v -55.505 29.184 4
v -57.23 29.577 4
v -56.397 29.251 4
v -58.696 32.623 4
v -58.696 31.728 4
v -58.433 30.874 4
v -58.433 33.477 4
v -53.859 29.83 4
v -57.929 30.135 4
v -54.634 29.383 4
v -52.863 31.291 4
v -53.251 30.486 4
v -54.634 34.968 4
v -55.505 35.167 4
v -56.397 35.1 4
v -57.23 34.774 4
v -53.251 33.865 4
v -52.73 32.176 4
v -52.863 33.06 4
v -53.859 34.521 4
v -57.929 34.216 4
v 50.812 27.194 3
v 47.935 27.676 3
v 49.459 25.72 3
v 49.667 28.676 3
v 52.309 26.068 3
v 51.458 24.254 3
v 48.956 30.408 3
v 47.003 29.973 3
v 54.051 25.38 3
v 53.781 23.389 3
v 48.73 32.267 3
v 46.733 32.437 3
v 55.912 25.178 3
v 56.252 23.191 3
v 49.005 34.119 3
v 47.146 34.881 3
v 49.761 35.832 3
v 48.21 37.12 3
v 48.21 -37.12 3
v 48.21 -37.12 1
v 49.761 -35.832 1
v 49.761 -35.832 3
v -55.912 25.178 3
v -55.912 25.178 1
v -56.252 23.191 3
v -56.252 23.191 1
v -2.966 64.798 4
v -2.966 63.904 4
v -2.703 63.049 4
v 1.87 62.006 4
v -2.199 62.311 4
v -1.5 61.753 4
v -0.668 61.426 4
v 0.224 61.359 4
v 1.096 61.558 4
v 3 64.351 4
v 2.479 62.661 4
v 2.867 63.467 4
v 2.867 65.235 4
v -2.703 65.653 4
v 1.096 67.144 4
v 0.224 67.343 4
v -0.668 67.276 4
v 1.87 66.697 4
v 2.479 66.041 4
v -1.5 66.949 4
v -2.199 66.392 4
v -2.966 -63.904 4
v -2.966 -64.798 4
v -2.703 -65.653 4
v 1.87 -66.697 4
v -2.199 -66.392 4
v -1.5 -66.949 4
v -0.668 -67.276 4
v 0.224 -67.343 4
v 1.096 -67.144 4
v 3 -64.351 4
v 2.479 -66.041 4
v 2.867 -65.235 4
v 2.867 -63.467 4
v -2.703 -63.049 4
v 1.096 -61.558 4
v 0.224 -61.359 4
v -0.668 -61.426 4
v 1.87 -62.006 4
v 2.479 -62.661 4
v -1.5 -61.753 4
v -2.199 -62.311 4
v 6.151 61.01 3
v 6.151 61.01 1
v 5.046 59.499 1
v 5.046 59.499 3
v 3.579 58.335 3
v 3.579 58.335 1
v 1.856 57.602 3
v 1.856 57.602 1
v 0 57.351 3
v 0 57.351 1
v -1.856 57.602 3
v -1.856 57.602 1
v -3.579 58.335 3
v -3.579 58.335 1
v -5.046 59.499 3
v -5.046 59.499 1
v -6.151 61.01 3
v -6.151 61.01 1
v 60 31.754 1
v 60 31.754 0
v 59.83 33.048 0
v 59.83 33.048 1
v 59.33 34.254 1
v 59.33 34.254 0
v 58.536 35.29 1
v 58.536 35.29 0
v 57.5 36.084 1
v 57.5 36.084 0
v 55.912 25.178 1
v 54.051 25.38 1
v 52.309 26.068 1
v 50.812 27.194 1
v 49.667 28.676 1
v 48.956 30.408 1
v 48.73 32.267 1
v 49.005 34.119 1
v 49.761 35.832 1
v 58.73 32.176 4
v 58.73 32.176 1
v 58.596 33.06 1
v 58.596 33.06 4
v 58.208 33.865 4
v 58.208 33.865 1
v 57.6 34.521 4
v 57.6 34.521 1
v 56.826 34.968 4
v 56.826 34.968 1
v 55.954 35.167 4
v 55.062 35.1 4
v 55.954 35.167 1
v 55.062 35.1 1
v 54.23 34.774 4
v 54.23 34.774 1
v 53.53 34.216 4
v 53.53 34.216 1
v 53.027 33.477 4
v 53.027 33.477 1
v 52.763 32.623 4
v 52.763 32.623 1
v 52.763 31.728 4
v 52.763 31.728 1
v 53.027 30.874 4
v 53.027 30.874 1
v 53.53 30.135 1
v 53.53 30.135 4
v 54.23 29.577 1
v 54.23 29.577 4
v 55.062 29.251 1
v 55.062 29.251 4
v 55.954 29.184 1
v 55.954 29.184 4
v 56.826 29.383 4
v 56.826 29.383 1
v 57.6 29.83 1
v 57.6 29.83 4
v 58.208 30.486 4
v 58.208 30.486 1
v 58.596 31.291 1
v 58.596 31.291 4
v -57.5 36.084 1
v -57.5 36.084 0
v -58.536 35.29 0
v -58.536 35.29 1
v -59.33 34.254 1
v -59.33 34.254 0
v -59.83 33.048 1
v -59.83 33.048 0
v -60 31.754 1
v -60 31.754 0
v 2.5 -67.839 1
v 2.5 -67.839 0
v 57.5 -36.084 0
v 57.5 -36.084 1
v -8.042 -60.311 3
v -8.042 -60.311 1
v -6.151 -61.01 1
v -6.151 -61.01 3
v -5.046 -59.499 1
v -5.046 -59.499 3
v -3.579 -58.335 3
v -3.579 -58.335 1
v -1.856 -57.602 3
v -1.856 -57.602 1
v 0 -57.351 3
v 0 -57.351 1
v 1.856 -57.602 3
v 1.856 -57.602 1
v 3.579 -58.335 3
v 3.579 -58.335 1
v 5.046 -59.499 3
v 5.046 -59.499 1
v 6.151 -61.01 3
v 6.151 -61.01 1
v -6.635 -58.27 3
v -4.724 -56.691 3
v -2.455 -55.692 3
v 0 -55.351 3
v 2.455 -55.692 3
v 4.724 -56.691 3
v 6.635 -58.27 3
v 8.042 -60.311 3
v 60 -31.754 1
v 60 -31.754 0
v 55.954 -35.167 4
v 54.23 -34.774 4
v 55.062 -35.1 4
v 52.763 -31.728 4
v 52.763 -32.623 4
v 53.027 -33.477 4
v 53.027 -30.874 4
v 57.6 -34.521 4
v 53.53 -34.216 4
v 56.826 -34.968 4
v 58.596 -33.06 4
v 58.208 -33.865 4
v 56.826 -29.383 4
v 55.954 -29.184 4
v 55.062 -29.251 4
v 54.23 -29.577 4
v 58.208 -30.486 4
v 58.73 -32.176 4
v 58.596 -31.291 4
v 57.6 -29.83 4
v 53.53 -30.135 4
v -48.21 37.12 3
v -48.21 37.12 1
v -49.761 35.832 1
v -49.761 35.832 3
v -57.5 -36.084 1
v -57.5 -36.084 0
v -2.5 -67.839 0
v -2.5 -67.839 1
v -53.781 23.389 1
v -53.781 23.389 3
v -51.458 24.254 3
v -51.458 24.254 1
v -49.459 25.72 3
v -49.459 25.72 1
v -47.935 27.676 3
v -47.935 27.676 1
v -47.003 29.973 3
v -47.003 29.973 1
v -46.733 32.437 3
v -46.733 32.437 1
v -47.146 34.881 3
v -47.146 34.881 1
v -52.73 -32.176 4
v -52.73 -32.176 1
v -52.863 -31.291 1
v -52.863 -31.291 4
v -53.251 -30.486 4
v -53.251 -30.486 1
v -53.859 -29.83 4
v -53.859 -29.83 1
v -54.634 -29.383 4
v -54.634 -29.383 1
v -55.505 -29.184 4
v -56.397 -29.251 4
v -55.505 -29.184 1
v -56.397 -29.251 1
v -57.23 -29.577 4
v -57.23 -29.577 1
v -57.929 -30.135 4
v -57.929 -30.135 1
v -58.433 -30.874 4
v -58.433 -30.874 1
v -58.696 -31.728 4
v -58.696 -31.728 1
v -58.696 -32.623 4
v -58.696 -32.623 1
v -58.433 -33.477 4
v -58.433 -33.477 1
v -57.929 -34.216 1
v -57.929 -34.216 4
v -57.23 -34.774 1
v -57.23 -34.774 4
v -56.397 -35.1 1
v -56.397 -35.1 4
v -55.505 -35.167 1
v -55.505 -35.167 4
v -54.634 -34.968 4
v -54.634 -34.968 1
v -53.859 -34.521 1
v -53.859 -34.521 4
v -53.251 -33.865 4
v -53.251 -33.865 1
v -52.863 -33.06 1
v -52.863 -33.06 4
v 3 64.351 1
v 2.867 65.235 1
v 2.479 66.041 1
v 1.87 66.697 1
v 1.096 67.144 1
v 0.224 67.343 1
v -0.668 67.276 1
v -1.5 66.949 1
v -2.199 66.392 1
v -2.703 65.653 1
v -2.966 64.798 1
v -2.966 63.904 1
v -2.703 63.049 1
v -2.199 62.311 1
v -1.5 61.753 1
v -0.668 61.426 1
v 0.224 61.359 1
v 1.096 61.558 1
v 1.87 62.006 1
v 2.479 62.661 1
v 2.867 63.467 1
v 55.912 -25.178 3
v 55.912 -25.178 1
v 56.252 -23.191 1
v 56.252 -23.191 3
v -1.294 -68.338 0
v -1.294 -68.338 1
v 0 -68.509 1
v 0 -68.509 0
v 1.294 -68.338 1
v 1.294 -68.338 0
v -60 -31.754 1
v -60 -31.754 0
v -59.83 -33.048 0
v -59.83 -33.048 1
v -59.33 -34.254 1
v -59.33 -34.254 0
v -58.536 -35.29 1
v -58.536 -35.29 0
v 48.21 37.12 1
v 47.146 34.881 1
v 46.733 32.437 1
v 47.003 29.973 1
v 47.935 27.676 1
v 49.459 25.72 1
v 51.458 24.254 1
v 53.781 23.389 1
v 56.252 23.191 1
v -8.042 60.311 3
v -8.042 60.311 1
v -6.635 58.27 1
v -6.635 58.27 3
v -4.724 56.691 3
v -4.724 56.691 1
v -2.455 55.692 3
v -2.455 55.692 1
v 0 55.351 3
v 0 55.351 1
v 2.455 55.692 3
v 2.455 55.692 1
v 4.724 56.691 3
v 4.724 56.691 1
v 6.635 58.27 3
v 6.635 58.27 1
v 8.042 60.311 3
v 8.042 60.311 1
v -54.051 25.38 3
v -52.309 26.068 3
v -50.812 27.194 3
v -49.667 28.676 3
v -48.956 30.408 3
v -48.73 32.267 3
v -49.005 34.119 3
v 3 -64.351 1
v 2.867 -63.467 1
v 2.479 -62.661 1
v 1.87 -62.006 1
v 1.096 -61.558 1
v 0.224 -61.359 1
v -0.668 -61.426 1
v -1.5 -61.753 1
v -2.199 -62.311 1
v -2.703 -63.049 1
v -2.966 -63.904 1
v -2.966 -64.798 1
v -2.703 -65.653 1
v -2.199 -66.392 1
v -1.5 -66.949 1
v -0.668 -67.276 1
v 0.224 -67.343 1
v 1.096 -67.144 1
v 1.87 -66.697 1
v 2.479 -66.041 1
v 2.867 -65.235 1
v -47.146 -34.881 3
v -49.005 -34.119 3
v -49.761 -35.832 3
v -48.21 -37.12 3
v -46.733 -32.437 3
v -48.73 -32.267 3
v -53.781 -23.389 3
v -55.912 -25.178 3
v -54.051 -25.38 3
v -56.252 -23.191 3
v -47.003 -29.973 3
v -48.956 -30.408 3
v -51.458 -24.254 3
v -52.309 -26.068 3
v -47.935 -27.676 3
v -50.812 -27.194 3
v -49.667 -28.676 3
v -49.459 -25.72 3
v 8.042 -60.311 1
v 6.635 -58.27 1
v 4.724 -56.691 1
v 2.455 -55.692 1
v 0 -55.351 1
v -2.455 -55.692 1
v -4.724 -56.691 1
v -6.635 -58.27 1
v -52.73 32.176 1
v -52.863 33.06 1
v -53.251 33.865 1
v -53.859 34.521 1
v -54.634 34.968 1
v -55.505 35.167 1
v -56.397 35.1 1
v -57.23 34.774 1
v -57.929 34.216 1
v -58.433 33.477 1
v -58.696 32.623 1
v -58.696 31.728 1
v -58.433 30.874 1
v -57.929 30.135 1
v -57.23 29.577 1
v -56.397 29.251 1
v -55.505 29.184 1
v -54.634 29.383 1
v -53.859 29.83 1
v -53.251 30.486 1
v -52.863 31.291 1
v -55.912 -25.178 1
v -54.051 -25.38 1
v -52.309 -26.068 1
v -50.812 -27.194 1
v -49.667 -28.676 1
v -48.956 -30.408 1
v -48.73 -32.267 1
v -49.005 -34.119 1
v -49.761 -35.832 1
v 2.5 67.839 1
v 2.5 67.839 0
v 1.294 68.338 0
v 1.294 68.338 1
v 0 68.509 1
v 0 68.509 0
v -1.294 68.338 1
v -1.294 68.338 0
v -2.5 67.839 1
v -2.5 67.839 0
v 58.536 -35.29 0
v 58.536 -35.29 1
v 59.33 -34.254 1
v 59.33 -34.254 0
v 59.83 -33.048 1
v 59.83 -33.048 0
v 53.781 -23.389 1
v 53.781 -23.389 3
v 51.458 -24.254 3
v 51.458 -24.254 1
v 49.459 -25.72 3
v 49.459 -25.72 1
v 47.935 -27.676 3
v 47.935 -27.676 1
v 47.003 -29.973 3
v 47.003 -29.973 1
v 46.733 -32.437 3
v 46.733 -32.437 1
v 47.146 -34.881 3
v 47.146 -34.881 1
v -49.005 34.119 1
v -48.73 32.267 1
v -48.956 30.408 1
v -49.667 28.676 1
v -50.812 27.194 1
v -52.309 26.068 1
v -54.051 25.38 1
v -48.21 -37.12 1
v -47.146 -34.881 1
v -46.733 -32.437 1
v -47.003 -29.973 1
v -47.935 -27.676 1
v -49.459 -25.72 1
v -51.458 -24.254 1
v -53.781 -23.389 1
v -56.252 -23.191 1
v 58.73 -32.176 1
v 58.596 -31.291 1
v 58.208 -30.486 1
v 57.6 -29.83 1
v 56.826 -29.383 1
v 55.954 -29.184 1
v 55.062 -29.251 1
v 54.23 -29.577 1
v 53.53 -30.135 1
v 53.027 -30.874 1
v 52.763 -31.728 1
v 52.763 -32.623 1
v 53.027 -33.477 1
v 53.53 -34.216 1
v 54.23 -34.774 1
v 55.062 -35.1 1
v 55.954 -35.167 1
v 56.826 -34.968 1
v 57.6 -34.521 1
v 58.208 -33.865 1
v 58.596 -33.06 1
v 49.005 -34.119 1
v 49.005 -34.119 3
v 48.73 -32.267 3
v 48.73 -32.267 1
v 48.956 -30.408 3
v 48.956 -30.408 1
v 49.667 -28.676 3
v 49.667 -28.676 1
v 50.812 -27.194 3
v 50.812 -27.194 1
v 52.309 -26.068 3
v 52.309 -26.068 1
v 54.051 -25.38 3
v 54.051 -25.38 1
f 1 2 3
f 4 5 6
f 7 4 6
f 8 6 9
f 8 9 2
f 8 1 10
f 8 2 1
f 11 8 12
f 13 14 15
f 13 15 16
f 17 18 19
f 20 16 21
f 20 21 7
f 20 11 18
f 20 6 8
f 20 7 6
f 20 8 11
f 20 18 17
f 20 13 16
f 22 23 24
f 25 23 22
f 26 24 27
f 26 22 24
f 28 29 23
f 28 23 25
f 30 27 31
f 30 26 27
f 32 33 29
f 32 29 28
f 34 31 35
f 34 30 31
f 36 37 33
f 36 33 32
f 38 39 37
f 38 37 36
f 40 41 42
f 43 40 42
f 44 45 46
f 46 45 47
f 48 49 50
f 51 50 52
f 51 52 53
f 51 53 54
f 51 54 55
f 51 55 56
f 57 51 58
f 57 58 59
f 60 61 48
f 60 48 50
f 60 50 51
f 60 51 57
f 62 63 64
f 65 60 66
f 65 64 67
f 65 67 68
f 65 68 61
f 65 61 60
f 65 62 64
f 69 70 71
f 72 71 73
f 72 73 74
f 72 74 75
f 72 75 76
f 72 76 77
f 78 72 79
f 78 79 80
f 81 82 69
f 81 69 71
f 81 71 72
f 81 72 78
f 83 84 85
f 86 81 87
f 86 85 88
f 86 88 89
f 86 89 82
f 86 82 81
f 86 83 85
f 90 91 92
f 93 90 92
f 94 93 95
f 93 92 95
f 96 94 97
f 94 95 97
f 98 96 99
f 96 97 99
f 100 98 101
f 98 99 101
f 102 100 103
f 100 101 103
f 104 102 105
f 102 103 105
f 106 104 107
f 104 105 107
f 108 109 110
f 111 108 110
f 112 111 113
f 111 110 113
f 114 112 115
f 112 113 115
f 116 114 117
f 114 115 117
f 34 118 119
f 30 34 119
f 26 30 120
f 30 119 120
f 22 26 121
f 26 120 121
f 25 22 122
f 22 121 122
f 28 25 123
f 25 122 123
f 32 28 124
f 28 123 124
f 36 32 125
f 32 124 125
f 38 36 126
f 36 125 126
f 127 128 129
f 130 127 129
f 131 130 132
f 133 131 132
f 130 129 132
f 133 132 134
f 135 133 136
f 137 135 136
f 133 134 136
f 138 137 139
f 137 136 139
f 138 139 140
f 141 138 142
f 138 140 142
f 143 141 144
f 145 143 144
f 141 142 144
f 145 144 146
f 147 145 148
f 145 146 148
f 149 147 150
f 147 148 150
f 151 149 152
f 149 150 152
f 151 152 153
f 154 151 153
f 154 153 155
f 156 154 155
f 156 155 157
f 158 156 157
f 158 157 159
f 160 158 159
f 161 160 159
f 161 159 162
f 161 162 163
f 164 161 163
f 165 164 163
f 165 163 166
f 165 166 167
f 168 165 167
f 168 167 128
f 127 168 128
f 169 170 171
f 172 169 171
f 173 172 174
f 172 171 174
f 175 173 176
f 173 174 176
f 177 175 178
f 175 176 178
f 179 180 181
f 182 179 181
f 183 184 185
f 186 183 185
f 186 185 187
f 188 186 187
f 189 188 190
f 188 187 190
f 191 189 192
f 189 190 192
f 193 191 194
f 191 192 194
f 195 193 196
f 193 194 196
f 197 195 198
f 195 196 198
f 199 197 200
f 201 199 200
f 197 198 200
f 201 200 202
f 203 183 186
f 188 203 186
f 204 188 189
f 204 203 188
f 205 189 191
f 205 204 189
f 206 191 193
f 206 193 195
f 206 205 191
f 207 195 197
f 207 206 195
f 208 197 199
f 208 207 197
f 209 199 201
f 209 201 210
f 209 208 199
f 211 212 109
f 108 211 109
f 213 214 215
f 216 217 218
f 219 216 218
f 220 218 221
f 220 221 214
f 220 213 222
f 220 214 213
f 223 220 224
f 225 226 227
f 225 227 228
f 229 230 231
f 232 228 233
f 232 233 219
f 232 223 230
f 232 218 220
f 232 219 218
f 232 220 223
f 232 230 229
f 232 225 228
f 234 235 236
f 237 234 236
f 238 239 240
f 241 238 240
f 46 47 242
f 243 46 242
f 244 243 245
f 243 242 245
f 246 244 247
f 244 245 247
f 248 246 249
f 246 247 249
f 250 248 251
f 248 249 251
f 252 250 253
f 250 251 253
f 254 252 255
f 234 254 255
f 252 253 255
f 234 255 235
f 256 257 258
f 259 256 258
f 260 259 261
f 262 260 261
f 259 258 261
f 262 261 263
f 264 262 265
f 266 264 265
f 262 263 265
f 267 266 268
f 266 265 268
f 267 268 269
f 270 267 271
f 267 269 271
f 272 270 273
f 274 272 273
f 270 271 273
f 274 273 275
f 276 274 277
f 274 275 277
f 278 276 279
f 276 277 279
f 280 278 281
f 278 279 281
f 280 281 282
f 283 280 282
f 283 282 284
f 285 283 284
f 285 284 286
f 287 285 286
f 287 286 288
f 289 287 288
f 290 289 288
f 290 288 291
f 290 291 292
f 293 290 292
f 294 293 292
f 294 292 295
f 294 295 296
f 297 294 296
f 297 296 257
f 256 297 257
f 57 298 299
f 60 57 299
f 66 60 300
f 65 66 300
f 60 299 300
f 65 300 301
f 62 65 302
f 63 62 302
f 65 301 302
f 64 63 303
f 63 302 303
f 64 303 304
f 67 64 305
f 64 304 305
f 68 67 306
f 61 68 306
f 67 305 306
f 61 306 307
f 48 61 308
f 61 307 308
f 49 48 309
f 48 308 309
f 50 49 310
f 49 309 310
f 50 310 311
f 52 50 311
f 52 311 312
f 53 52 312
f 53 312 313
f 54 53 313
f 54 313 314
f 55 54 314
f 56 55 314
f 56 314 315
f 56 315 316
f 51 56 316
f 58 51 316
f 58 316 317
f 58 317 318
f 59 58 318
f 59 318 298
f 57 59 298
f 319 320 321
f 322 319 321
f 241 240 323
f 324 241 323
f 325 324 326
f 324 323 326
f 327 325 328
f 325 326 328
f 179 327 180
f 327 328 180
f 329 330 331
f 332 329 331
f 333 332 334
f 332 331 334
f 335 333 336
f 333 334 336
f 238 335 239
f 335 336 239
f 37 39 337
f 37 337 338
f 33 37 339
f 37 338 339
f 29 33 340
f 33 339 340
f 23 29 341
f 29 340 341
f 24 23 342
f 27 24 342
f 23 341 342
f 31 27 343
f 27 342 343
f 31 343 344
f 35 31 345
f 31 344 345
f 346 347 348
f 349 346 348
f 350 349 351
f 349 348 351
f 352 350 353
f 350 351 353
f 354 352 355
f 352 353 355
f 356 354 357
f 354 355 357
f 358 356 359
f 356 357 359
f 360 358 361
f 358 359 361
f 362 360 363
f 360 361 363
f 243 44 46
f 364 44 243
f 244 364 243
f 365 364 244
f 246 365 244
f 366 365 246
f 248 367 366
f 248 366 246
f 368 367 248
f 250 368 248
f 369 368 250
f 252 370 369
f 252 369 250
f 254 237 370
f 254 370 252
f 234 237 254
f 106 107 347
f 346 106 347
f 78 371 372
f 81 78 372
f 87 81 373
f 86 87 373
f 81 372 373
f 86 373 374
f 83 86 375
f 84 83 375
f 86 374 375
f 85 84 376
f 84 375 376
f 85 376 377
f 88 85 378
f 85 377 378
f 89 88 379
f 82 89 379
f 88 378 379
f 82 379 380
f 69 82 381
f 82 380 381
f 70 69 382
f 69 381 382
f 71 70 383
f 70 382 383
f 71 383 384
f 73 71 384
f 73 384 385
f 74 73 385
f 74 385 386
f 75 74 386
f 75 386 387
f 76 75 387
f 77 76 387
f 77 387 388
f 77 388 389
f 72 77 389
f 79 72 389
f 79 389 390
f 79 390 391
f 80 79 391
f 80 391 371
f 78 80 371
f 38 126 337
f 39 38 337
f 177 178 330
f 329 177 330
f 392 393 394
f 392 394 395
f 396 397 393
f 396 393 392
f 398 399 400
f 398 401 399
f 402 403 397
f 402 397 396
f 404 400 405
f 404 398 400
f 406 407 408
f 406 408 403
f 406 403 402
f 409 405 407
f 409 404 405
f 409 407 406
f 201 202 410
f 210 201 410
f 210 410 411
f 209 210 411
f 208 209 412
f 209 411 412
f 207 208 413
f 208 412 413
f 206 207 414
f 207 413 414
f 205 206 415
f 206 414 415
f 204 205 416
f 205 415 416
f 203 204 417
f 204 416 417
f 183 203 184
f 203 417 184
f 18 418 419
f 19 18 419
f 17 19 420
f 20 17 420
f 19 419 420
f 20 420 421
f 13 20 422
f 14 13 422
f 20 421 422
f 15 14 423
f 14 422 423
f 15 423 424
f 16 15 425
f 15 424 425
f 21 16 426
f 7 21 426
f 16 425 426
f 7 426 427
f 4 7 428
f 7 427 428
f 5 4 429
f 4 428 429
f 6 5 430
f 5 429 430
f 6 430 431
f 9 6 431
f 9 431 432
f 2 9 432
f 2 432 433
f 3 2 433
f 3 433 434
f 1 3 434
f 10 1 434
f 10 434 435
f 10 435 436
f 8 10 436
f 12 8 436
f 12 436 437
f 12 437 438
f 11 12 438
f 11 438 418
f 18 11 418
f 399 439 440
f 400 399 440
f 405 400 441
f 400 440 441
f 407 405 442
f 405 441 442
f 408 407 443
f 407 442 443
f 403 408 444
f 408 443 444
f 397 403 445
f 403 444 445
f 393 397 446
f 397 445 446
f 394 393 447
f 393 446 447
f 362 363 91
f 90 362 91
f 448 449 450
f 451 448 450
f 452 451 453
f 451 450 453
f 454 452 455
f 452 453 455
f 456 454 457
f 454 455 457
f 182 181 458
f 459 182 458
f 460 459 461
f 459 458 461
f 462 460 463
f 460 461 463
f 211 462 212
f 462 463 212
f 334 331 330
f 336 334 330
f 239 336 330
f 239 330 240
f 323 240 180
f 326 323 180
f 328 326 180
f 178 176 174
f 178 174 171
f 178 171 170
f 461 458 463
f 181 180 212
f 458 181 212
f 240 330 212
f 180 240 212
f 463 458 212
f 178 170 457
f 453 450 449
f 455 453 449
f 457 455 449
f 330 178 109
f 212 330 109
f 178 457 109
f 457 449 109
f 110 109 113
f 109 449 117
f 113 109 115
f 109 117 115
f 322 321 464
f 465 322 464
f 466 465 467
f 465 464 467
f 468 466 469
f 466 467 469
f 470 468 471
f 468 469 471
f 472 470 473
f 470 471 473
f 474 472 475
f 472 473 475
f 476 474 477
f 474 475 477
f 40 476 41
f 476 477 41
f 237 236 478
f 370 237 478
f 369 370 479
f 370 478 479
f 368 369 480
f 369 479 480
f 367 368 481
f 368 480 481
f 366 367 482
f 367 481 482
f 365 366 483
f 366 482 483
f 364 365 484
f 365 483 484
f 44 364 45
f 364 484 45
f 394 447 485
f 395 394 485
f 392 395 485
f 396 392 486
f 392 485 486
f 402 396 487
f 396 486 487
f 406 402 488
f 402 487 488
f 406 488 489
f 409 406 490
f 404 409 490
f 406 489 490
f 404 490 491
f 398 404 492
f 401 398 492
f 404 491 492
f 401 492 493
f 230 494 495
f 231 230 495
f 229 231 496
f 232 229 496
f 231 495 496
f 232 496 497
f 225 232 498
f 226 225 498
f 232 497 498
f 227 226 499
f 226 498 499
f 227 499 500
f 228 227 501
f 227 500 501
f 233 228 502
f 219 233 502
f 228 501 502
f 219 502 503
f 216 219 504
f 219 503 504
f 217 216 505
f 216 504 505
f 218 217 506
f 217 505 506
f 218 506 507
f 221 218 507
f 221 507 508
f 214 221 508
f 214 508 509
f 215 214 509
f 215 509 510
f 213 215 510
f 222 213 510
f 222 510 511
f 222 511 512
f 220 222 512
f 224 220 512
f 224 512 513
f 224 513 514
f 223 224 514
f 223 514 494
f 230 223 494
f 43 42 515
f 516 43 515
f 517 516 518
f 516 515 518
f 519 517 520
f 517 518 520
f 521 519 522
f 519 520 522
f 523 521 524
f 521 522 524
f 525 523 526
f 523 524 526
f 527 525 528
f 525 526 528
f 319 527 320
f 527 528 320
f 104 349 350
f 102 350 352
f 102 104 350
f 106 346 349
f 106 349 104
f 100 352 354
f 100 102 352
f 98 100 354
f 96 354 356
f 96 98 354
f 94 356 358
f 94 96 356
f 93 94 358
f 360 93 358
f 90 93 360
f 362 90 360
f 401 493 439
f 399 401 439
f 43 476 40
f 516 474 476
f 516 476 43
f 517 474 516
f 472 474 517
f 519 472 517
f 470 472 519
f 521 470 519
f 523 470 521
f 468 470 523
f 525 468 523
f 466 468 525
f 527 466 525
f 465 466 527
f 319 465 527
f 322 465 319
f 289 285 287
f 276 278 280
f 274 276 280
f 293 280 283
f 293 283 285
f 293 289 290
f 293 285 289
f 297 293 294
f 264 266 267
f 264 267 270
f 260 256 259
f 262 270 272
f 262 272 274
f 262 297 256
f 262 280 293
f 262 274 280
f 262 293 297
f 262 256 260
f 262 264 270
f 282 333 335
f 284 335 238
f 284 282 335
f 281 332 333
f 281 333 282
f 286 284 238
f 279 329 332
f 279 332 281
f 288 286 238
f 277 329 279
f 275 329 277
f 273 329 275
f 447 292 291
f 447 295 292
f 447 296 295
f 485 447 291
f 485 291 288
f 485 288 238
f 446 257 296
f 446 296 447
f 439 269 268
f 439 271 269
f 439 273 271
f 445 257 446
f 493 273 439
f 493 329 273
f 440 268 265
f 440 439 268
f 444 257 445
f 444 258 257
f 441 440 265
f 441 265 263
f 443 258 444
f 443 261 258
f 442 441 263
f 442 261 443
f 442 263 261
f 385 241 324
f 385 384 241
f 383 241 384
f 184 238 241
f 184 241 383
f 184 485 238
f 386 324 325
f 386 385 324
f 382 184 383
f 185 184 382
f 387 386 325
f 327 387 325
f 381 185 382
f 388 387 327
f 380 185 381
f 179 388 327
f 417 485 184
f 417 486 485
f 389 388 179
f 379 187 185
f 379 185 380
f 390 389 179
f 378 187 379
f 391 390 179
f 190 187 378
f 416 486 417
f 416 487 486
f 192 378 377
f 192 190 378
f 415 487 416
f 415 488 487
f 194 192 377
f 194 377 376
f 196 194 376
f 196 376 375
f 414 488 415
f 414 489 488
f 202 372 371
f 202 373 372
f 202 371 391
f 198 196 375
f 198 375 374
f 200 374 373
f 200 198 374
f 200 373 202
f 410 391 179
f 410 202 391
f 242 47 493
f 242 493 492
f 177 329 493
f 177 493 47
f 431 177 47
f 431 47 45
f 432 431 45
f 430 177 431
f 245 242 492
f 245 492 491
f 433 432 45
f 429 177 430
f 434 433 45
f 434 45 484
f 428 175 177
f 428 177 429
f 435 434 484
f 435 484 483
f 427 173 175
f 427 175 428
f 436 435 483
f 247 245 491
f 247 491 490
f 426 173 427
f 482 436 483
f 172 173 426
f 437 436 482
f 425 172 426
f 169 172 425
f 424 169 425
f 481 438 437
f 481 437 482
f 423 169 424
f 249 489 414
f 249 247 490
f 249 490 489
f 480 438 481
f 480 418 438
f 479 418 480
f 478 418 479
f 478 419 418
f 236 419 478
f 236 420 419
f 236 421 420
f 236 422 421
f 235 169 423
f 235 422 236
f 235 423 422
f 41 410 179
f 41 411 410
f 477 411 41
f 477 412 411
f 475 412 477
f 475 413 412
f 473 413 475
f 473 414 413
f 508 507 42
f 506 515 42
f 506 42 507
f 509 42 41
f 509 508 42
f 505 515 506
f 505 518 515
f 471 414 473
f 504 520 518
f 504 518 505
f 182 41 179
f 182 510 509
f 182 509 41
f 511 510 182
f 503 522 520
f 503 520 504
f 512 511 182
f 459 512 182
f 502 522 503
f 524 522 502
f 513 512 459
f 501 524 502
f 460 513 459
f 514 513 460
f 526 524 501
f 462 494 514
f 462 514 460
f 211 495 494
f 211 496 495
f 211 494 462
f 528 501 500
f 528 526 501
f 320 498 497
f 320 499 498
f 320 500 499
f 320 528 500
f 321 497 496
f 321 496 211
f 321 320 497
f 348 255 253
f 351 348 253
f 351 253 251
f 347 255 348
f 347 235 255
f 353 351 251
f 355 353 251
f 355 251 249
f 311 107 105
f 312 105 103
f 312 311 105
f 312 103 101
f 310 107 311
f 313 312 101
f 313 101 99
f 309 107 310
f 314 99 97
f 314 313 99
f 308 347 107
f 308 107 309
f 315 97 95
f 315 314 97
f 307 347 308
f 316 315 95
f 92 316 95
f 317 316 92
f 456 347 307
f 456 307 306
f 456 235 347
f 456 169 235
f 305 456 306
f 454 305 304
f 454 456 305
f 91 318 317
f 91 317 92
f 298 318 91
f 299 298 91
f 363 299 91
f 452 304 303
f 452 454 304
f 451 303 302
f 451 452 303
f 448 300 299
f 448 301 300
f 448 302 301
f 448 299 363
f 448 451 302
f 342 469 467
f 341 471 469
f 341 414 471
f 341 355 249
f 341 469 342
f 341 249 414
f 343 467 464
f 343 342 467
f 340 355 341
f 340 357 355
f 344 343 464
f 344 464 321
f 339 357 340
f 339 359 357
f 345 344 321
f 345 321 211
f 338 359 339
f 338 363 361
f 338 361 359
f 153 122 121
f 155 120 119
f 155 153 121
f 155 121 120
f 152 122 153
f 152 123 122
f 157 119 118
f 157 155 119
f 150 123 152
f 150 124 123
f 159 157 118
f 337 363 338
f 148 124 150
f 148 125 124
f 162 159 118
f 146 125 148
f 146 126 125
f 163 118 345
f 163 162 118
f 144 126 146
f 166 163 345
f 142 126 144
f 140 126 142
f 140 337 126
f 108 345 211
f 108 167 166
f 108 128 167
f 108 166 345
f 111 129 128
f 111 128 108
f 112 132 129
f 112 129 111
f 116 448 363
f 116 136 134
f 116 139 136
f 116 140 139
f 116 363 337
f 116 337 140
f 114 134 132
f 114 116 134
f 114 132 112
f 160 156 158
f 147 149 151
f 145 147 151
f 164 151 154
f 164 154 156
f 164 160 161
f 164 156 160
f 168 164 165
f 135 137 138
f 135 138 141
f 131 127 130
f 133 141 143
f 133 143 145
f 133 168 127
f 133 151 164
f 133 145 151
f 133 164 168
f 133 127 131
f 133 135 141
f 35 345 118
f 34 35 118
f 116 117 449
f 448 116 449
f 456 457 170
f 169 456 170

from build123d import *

# Parameters (mm, degrees)
F0_R     = 3
F1_DEPTH = 1
F2_DEPTH = 3
F3_DEPTH = 4


with BuildPart() as f1:
    # F0 (on Top) → F1 (new body)
    with BuildSketch(Plane.XY):
        with BuildLine():
            Line((60, -31.7542648054), (60, 31.7542648054))
            ThreePointArc((60, 31.7542648054), (59.3301270189, 34.2542648054), (57.5, 36.0843918244))
            Line((57.5, 36.0843918244), (2.5, 67.8386566298))
            ThreePointArc((2.5, 67.8386566298), (0, 68.5085296109), (-2.5, 67.8386566298))
            Line((-2.5, 67.8386566298), (-57.5, 36.0843918244))
            ThreePointArc((-57.5, 36.0843918244), (-59.3301270189, 34.2542648054), (-60, 31.7542648054))
            Line((-60, 31.7542648054), (-60, -31.7542648054))
            ThreePointArc((-60, -31.7542648054), (-59.3301270189, -34.2542648054), (-57.5, -36.0843918244))
            Line((-57.5, -36.0843918244), (-2.5, -67.8386566298))
            ThreePointArc((-2.5, -67.8386566298), (0, -68.5085296109), (2.5, -67.8386566298))
            Line((2.5, -67.8386566298), (57.5, -36.0843918244))
            ThreePointArc((57.5, -36.0843918244), (59.3301270189, -34.2542648054), (60, -31.7542648054))
        make_face()
        with Locations((-55.7296181053, -32.1755099552)):
            Circle(F0_R, mode=Mode.SUBTRACT)
        with BuildLine():
            Line((-48.2098294683, -37.1204850669), (-49.760809999, -35.8324663113))
            ThreePointArc((-49.760809999, -35.8324663113), (-49.667440276, -28.6755099601), (-55.9122311458, -25.1778923265))
            Line((-55.9122311458, -25.1778923265), (-56.2521978402, -23.1906944078))
            ThreePointArc((-56.2521978402, -23.1906944078), (-47.9353894676, -27.6755099615), (-48.2098294683, -37.1204850669))
        make_face(mode=Mode.SUBTRACT)
        with Locations((0, -64.35102)):
            Circle(F0_R, mode=Mode.SUBTRACT)
        with BuildLine():
            Line((8.042368383, -60.3111795587), (6.1514211554, -61.0103587227))
            ThreePointArc((6.1514211554, -61.0103587227), (0, -57.35102), (-6.1514211554, -61.0103587227))
            Line((-6.1514211554, -61.0103587227), (-8.042368383, -60.3111795587))
            ThreePointArc((-8.042368383, -60.3111795587), (0, -55.35102), (8.042368383, -60.3111795587))
        make_face(mode=Mode.SUBTRACT)
        with BuildLine():
            Line((56.2521977284, -23.190694679), (55.9122310244, -25.1778925961))
            ThreePointArc((55.9122310244, -25.1778925961), (49.6674401378, -28.6755101995), (49.7608098263, -35.8324665512))
            Line((49.7608098263, -35.8324665512), (48.2098292894, -37.1204852993))
            ThreePointArc((48.2098292894, -37.1204852993), (47.9353893342, -27.6755101926), (56.2521977284, -23.190694679))
        make_face(mode=Mode.SUBTRACT)
        with Locations((55.7296179502, -32.1755102239)):
            Circle(F0_R, mode=Mode.SUBTRACT)
        with Locations((-55.7296180277, 32.1755100895)):
            Circle(F0_R, mode=Mode.SUBTRACT)
        with BuildLine():
            Line((-56.2521977843, 23.1906945434), (-55.9122310851, 25.1778924613))
            ThreePointArc((-55.9122310851, 25.1778924613), (-49.6674402069, 28.6755100798), (-49.7608099126, 35.8324664312))
            Line((-49.7608099126, 35.8324664312), (-48.2098293788, 37.1204851831))
            ThreePointArc((-48.2098293788, 37.1204851831), (-47.9353894009, 27.675510077), (-56.2521977843, 23.1906945434))
        make_face(mode=Mode.SUBTRACT)
        with BuildLine():
            Line((48.2098295578, 37.1204849507), (49.7608100854, 35.8324661914))
            ThreePointArc((49.7608100854, 35.8324661914), (49.6674403451, 28.6755098404), (55.9122312065, 25.1778921918))
            Line((55.9122312065, 25.1778921918), (56.2521978961, 23.1906942723))
            ThreePointArc((56.2521978961, 23.1906942723), (47.9353895343, 27.675509846), (48.2098295578, 37.1204849507))
        make_face(mode=Mode.SUBTRACT)
        with Locations((55.7296181828, 32.1755098209)):
            Circle(F0_R, mode=Mode.SUBTRACT)
        with BuildLine():
            Line((-8.0423682377, 60.311179578), (-6.1514210083, 61.0103587375))
            ThreePointArc((-6.1514210083, 61.0103587375), (1.382e-07, 57.35102), (6.1514213024, 61.0103587079))
            Line((6.1514213024, 61.0103587079), (8.0423685284, 60.3111795393))
            ThreePointArc((8.0423685284, 60.3111795393), (1.334e-07, 55.35102), (-8.0423682377, 60.311179578))
        make_face(mode=Mode.SUBTRACT)
        with Locations((1.551e-07, 64.35102)):
            Circle(F0_R, mode=Mode.SUBTRACT)
    extrude(amount=F1_DEPTH)

    # F0 (on Top) → F2 (join)
    with BuildSketch(Plane.XY):
        with BuildLine():
            ThreePointArc((-6.1514211554, -61.0103587227), (0, -57.35102), (6.1514211554, -61.0103587227))
            Line((6.1514211554, -61.0103587227), (8.042368383, -60.3111795587))
            ThreePointArc((8.042368383, -60.3111795587), (0, -55.35102), (-8.042368383, -60.3111795587))
            Line((-8.042368383, -60.3111795587), (-6.1514211554, -61.0103587227))
        make_face()
        with BuildLine():
            ThreePointArc((-55.9122311458, -25.1778923265), (-49.667440276, -28.6755099601), (-49.760809999, -35.8324663113))
            Line((-49.760809999, -35.8324663113), (-48.2098294683, -37.1204850669))
            ThreePointArc((-48.2098294683, -37.1204850669), (-47.9353894676, -27.6755099615), (-56.2521978402, -23.1906944078))
            Line((-56.2521978402, -23.1906944078), (-55.9122311458, -25.1778923265))
        make_face()
        with BuildLine():
            ThreePointArc((49.7608098263, -35.8324665512), (49.6674401378, -28.6755101995), (55.9122310244, -25.1778925961))
            Line((55.9122310244, -25.1778925961), (56.2521977284, -23.190694679))
            ThreePointArc((56.2521977284, -23.190694679), (47.9353893342, -27.6755101926), (48.2098292894, -37.1204852993))
            Line((48.2098292894, -37.1204852993), (49.7608098263, -35.8324665512))
        make_face()
        with BuildLine():
            ThreePointArc((-49.7608099126, 35.8324664312), (-49.6674402069, 28.6755100798), (-55.9122310851, 25.1778924613))
            Line((-55.9122310851, 25.1778924613), (-56.2521977843, 23.1906945434))
            ThreePointArc((-56.2521977843, 23.1906945434), (-47.9353894009, 27.675510077), (-48.2098293788, 37.1204851831))
            Line((-48.2098293788, 37.1204851831), (-49.7608099126, 35.8324664312))
        make_face()
        with BuildLine():
            ThreePointArc((6.1514213024, 61.0103587079), (1.382e-07, 57.35102), (-6.1514210083, 61.0103587375))
            Line((-6.1514210083, 61.0103587375), (-8.0423682377, 60.311179578))
            ThreePointArc((-8.0423682377, 60.311179578), (1.334e-07, 55.35102), (8.0423685284, 60.3111795393))
            Line((8.0423685284, 60.3111795393), (6.1514213024, 61.0103587079))
        make_face()
        with BuildLine():
            ThreePointArc((55.9122312065, 25.1778921918), (49.6674403451, 28.6755098404), (49.7608100854, 35.8324661914))
            Line((49.7608100854, 35.8324661914), (48.2098295578, 37.1204849507))
            ThreePointArc((48.2098295578, 37.1204849507), (47.9353895343, 27.675509846), (56.2521978961, 23.1906942723))
            Line((56.2521978961, 23.1906942723), (55.9122312065, 25.1778921918))
        make_face()
    extrude(amount=F2_DEPTH)

    # F0 (on Top) → F3 (join)
    with BuildSketch(Plane.XY):
        with Locations((-55.7296181053, -32.1755099552)):
            Circle(F0_R)
        with Locations((0, -64.35102)):
            Circle(F0_R)
        with Locations((55.7296179502, -32.1755102239)):
            Circle(F0_R)
        with Locations((55.7296181828, 32.1755098209)):
            Circle(F0_R)
        with Locations((1.551e-07, 64.35102)):
            Circle(F0_R)
        with Locations((-55.7296180277, 32.1755100895)):
            Circle(F0_R)
    extrude(amount=F3_DEPTH)


solid = f1.part
